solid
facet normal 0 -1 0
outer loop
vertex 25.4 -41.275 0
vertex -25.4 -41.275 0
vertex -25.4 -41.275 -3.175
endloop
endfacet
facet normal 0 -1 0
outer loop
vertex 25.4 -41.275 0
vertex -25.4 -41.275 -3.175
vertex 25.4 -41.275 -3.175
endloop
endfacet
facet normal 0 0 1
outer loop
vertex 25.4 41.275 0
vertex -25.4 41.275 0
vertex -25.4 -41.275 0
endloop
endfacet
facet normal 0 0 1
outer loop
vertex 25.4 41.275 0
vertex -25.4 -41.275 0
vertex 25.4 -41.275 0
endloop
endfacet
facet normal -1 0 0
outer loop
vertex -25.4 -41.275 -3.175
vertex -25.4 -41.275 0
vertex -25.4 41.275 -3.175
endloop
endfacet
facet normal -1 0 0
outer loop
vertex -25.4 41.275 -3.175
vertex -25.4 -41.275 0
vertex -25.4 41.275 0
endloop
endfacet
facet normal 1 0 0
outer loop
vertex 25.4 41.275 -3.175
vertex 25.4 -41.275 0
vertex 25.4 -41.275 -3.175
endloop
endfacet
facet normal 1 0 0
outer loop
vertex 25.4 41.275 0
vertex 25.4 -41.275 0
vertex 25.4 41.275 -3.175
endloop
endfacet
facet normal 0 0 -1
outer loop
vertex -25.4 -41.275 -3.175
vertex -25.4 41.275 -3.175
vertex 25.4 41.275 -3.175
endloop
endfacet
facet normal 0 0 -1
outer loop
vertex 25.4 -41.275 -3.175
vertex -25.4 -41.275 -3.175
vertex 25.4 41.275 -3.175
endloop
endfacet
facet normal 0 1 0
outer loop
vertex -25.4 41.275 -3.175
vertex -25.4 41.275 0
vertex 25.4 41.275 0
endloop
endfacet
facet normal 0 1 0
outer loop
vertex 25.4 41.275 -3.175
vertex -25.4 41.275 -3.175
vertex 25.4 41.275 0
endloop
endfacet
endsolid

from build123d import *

# Parameters (mm, degrees)
F0_W     = 50.8
F0_H     = 82.55
F3_DEPTH = 3.175
F4_D     = 26.19502
F5_DEPTH = 50.8


with BuildPart() as f3:
    # F0 (on Top) → F3 (new body)
    with BuildSketch(Plane.XY):
        Rectangle(F0_W, F0_H)
    extrude(amount=-F3_DEPTH)

    # F4 (through all)
    with Locations(Plane.XY):
        with Locations((0, -22.225)):
            Hole(F4_D / 2)

    # F5 (add): a face of the model
    f5_faces = [f3.faces().sort_by_distance(p)[0] for p in [
        (25.4, 0, -1.5875),
    ]]
    extrude(f5_faces, amount=-F5_DEPTH)


solid = f3.part
